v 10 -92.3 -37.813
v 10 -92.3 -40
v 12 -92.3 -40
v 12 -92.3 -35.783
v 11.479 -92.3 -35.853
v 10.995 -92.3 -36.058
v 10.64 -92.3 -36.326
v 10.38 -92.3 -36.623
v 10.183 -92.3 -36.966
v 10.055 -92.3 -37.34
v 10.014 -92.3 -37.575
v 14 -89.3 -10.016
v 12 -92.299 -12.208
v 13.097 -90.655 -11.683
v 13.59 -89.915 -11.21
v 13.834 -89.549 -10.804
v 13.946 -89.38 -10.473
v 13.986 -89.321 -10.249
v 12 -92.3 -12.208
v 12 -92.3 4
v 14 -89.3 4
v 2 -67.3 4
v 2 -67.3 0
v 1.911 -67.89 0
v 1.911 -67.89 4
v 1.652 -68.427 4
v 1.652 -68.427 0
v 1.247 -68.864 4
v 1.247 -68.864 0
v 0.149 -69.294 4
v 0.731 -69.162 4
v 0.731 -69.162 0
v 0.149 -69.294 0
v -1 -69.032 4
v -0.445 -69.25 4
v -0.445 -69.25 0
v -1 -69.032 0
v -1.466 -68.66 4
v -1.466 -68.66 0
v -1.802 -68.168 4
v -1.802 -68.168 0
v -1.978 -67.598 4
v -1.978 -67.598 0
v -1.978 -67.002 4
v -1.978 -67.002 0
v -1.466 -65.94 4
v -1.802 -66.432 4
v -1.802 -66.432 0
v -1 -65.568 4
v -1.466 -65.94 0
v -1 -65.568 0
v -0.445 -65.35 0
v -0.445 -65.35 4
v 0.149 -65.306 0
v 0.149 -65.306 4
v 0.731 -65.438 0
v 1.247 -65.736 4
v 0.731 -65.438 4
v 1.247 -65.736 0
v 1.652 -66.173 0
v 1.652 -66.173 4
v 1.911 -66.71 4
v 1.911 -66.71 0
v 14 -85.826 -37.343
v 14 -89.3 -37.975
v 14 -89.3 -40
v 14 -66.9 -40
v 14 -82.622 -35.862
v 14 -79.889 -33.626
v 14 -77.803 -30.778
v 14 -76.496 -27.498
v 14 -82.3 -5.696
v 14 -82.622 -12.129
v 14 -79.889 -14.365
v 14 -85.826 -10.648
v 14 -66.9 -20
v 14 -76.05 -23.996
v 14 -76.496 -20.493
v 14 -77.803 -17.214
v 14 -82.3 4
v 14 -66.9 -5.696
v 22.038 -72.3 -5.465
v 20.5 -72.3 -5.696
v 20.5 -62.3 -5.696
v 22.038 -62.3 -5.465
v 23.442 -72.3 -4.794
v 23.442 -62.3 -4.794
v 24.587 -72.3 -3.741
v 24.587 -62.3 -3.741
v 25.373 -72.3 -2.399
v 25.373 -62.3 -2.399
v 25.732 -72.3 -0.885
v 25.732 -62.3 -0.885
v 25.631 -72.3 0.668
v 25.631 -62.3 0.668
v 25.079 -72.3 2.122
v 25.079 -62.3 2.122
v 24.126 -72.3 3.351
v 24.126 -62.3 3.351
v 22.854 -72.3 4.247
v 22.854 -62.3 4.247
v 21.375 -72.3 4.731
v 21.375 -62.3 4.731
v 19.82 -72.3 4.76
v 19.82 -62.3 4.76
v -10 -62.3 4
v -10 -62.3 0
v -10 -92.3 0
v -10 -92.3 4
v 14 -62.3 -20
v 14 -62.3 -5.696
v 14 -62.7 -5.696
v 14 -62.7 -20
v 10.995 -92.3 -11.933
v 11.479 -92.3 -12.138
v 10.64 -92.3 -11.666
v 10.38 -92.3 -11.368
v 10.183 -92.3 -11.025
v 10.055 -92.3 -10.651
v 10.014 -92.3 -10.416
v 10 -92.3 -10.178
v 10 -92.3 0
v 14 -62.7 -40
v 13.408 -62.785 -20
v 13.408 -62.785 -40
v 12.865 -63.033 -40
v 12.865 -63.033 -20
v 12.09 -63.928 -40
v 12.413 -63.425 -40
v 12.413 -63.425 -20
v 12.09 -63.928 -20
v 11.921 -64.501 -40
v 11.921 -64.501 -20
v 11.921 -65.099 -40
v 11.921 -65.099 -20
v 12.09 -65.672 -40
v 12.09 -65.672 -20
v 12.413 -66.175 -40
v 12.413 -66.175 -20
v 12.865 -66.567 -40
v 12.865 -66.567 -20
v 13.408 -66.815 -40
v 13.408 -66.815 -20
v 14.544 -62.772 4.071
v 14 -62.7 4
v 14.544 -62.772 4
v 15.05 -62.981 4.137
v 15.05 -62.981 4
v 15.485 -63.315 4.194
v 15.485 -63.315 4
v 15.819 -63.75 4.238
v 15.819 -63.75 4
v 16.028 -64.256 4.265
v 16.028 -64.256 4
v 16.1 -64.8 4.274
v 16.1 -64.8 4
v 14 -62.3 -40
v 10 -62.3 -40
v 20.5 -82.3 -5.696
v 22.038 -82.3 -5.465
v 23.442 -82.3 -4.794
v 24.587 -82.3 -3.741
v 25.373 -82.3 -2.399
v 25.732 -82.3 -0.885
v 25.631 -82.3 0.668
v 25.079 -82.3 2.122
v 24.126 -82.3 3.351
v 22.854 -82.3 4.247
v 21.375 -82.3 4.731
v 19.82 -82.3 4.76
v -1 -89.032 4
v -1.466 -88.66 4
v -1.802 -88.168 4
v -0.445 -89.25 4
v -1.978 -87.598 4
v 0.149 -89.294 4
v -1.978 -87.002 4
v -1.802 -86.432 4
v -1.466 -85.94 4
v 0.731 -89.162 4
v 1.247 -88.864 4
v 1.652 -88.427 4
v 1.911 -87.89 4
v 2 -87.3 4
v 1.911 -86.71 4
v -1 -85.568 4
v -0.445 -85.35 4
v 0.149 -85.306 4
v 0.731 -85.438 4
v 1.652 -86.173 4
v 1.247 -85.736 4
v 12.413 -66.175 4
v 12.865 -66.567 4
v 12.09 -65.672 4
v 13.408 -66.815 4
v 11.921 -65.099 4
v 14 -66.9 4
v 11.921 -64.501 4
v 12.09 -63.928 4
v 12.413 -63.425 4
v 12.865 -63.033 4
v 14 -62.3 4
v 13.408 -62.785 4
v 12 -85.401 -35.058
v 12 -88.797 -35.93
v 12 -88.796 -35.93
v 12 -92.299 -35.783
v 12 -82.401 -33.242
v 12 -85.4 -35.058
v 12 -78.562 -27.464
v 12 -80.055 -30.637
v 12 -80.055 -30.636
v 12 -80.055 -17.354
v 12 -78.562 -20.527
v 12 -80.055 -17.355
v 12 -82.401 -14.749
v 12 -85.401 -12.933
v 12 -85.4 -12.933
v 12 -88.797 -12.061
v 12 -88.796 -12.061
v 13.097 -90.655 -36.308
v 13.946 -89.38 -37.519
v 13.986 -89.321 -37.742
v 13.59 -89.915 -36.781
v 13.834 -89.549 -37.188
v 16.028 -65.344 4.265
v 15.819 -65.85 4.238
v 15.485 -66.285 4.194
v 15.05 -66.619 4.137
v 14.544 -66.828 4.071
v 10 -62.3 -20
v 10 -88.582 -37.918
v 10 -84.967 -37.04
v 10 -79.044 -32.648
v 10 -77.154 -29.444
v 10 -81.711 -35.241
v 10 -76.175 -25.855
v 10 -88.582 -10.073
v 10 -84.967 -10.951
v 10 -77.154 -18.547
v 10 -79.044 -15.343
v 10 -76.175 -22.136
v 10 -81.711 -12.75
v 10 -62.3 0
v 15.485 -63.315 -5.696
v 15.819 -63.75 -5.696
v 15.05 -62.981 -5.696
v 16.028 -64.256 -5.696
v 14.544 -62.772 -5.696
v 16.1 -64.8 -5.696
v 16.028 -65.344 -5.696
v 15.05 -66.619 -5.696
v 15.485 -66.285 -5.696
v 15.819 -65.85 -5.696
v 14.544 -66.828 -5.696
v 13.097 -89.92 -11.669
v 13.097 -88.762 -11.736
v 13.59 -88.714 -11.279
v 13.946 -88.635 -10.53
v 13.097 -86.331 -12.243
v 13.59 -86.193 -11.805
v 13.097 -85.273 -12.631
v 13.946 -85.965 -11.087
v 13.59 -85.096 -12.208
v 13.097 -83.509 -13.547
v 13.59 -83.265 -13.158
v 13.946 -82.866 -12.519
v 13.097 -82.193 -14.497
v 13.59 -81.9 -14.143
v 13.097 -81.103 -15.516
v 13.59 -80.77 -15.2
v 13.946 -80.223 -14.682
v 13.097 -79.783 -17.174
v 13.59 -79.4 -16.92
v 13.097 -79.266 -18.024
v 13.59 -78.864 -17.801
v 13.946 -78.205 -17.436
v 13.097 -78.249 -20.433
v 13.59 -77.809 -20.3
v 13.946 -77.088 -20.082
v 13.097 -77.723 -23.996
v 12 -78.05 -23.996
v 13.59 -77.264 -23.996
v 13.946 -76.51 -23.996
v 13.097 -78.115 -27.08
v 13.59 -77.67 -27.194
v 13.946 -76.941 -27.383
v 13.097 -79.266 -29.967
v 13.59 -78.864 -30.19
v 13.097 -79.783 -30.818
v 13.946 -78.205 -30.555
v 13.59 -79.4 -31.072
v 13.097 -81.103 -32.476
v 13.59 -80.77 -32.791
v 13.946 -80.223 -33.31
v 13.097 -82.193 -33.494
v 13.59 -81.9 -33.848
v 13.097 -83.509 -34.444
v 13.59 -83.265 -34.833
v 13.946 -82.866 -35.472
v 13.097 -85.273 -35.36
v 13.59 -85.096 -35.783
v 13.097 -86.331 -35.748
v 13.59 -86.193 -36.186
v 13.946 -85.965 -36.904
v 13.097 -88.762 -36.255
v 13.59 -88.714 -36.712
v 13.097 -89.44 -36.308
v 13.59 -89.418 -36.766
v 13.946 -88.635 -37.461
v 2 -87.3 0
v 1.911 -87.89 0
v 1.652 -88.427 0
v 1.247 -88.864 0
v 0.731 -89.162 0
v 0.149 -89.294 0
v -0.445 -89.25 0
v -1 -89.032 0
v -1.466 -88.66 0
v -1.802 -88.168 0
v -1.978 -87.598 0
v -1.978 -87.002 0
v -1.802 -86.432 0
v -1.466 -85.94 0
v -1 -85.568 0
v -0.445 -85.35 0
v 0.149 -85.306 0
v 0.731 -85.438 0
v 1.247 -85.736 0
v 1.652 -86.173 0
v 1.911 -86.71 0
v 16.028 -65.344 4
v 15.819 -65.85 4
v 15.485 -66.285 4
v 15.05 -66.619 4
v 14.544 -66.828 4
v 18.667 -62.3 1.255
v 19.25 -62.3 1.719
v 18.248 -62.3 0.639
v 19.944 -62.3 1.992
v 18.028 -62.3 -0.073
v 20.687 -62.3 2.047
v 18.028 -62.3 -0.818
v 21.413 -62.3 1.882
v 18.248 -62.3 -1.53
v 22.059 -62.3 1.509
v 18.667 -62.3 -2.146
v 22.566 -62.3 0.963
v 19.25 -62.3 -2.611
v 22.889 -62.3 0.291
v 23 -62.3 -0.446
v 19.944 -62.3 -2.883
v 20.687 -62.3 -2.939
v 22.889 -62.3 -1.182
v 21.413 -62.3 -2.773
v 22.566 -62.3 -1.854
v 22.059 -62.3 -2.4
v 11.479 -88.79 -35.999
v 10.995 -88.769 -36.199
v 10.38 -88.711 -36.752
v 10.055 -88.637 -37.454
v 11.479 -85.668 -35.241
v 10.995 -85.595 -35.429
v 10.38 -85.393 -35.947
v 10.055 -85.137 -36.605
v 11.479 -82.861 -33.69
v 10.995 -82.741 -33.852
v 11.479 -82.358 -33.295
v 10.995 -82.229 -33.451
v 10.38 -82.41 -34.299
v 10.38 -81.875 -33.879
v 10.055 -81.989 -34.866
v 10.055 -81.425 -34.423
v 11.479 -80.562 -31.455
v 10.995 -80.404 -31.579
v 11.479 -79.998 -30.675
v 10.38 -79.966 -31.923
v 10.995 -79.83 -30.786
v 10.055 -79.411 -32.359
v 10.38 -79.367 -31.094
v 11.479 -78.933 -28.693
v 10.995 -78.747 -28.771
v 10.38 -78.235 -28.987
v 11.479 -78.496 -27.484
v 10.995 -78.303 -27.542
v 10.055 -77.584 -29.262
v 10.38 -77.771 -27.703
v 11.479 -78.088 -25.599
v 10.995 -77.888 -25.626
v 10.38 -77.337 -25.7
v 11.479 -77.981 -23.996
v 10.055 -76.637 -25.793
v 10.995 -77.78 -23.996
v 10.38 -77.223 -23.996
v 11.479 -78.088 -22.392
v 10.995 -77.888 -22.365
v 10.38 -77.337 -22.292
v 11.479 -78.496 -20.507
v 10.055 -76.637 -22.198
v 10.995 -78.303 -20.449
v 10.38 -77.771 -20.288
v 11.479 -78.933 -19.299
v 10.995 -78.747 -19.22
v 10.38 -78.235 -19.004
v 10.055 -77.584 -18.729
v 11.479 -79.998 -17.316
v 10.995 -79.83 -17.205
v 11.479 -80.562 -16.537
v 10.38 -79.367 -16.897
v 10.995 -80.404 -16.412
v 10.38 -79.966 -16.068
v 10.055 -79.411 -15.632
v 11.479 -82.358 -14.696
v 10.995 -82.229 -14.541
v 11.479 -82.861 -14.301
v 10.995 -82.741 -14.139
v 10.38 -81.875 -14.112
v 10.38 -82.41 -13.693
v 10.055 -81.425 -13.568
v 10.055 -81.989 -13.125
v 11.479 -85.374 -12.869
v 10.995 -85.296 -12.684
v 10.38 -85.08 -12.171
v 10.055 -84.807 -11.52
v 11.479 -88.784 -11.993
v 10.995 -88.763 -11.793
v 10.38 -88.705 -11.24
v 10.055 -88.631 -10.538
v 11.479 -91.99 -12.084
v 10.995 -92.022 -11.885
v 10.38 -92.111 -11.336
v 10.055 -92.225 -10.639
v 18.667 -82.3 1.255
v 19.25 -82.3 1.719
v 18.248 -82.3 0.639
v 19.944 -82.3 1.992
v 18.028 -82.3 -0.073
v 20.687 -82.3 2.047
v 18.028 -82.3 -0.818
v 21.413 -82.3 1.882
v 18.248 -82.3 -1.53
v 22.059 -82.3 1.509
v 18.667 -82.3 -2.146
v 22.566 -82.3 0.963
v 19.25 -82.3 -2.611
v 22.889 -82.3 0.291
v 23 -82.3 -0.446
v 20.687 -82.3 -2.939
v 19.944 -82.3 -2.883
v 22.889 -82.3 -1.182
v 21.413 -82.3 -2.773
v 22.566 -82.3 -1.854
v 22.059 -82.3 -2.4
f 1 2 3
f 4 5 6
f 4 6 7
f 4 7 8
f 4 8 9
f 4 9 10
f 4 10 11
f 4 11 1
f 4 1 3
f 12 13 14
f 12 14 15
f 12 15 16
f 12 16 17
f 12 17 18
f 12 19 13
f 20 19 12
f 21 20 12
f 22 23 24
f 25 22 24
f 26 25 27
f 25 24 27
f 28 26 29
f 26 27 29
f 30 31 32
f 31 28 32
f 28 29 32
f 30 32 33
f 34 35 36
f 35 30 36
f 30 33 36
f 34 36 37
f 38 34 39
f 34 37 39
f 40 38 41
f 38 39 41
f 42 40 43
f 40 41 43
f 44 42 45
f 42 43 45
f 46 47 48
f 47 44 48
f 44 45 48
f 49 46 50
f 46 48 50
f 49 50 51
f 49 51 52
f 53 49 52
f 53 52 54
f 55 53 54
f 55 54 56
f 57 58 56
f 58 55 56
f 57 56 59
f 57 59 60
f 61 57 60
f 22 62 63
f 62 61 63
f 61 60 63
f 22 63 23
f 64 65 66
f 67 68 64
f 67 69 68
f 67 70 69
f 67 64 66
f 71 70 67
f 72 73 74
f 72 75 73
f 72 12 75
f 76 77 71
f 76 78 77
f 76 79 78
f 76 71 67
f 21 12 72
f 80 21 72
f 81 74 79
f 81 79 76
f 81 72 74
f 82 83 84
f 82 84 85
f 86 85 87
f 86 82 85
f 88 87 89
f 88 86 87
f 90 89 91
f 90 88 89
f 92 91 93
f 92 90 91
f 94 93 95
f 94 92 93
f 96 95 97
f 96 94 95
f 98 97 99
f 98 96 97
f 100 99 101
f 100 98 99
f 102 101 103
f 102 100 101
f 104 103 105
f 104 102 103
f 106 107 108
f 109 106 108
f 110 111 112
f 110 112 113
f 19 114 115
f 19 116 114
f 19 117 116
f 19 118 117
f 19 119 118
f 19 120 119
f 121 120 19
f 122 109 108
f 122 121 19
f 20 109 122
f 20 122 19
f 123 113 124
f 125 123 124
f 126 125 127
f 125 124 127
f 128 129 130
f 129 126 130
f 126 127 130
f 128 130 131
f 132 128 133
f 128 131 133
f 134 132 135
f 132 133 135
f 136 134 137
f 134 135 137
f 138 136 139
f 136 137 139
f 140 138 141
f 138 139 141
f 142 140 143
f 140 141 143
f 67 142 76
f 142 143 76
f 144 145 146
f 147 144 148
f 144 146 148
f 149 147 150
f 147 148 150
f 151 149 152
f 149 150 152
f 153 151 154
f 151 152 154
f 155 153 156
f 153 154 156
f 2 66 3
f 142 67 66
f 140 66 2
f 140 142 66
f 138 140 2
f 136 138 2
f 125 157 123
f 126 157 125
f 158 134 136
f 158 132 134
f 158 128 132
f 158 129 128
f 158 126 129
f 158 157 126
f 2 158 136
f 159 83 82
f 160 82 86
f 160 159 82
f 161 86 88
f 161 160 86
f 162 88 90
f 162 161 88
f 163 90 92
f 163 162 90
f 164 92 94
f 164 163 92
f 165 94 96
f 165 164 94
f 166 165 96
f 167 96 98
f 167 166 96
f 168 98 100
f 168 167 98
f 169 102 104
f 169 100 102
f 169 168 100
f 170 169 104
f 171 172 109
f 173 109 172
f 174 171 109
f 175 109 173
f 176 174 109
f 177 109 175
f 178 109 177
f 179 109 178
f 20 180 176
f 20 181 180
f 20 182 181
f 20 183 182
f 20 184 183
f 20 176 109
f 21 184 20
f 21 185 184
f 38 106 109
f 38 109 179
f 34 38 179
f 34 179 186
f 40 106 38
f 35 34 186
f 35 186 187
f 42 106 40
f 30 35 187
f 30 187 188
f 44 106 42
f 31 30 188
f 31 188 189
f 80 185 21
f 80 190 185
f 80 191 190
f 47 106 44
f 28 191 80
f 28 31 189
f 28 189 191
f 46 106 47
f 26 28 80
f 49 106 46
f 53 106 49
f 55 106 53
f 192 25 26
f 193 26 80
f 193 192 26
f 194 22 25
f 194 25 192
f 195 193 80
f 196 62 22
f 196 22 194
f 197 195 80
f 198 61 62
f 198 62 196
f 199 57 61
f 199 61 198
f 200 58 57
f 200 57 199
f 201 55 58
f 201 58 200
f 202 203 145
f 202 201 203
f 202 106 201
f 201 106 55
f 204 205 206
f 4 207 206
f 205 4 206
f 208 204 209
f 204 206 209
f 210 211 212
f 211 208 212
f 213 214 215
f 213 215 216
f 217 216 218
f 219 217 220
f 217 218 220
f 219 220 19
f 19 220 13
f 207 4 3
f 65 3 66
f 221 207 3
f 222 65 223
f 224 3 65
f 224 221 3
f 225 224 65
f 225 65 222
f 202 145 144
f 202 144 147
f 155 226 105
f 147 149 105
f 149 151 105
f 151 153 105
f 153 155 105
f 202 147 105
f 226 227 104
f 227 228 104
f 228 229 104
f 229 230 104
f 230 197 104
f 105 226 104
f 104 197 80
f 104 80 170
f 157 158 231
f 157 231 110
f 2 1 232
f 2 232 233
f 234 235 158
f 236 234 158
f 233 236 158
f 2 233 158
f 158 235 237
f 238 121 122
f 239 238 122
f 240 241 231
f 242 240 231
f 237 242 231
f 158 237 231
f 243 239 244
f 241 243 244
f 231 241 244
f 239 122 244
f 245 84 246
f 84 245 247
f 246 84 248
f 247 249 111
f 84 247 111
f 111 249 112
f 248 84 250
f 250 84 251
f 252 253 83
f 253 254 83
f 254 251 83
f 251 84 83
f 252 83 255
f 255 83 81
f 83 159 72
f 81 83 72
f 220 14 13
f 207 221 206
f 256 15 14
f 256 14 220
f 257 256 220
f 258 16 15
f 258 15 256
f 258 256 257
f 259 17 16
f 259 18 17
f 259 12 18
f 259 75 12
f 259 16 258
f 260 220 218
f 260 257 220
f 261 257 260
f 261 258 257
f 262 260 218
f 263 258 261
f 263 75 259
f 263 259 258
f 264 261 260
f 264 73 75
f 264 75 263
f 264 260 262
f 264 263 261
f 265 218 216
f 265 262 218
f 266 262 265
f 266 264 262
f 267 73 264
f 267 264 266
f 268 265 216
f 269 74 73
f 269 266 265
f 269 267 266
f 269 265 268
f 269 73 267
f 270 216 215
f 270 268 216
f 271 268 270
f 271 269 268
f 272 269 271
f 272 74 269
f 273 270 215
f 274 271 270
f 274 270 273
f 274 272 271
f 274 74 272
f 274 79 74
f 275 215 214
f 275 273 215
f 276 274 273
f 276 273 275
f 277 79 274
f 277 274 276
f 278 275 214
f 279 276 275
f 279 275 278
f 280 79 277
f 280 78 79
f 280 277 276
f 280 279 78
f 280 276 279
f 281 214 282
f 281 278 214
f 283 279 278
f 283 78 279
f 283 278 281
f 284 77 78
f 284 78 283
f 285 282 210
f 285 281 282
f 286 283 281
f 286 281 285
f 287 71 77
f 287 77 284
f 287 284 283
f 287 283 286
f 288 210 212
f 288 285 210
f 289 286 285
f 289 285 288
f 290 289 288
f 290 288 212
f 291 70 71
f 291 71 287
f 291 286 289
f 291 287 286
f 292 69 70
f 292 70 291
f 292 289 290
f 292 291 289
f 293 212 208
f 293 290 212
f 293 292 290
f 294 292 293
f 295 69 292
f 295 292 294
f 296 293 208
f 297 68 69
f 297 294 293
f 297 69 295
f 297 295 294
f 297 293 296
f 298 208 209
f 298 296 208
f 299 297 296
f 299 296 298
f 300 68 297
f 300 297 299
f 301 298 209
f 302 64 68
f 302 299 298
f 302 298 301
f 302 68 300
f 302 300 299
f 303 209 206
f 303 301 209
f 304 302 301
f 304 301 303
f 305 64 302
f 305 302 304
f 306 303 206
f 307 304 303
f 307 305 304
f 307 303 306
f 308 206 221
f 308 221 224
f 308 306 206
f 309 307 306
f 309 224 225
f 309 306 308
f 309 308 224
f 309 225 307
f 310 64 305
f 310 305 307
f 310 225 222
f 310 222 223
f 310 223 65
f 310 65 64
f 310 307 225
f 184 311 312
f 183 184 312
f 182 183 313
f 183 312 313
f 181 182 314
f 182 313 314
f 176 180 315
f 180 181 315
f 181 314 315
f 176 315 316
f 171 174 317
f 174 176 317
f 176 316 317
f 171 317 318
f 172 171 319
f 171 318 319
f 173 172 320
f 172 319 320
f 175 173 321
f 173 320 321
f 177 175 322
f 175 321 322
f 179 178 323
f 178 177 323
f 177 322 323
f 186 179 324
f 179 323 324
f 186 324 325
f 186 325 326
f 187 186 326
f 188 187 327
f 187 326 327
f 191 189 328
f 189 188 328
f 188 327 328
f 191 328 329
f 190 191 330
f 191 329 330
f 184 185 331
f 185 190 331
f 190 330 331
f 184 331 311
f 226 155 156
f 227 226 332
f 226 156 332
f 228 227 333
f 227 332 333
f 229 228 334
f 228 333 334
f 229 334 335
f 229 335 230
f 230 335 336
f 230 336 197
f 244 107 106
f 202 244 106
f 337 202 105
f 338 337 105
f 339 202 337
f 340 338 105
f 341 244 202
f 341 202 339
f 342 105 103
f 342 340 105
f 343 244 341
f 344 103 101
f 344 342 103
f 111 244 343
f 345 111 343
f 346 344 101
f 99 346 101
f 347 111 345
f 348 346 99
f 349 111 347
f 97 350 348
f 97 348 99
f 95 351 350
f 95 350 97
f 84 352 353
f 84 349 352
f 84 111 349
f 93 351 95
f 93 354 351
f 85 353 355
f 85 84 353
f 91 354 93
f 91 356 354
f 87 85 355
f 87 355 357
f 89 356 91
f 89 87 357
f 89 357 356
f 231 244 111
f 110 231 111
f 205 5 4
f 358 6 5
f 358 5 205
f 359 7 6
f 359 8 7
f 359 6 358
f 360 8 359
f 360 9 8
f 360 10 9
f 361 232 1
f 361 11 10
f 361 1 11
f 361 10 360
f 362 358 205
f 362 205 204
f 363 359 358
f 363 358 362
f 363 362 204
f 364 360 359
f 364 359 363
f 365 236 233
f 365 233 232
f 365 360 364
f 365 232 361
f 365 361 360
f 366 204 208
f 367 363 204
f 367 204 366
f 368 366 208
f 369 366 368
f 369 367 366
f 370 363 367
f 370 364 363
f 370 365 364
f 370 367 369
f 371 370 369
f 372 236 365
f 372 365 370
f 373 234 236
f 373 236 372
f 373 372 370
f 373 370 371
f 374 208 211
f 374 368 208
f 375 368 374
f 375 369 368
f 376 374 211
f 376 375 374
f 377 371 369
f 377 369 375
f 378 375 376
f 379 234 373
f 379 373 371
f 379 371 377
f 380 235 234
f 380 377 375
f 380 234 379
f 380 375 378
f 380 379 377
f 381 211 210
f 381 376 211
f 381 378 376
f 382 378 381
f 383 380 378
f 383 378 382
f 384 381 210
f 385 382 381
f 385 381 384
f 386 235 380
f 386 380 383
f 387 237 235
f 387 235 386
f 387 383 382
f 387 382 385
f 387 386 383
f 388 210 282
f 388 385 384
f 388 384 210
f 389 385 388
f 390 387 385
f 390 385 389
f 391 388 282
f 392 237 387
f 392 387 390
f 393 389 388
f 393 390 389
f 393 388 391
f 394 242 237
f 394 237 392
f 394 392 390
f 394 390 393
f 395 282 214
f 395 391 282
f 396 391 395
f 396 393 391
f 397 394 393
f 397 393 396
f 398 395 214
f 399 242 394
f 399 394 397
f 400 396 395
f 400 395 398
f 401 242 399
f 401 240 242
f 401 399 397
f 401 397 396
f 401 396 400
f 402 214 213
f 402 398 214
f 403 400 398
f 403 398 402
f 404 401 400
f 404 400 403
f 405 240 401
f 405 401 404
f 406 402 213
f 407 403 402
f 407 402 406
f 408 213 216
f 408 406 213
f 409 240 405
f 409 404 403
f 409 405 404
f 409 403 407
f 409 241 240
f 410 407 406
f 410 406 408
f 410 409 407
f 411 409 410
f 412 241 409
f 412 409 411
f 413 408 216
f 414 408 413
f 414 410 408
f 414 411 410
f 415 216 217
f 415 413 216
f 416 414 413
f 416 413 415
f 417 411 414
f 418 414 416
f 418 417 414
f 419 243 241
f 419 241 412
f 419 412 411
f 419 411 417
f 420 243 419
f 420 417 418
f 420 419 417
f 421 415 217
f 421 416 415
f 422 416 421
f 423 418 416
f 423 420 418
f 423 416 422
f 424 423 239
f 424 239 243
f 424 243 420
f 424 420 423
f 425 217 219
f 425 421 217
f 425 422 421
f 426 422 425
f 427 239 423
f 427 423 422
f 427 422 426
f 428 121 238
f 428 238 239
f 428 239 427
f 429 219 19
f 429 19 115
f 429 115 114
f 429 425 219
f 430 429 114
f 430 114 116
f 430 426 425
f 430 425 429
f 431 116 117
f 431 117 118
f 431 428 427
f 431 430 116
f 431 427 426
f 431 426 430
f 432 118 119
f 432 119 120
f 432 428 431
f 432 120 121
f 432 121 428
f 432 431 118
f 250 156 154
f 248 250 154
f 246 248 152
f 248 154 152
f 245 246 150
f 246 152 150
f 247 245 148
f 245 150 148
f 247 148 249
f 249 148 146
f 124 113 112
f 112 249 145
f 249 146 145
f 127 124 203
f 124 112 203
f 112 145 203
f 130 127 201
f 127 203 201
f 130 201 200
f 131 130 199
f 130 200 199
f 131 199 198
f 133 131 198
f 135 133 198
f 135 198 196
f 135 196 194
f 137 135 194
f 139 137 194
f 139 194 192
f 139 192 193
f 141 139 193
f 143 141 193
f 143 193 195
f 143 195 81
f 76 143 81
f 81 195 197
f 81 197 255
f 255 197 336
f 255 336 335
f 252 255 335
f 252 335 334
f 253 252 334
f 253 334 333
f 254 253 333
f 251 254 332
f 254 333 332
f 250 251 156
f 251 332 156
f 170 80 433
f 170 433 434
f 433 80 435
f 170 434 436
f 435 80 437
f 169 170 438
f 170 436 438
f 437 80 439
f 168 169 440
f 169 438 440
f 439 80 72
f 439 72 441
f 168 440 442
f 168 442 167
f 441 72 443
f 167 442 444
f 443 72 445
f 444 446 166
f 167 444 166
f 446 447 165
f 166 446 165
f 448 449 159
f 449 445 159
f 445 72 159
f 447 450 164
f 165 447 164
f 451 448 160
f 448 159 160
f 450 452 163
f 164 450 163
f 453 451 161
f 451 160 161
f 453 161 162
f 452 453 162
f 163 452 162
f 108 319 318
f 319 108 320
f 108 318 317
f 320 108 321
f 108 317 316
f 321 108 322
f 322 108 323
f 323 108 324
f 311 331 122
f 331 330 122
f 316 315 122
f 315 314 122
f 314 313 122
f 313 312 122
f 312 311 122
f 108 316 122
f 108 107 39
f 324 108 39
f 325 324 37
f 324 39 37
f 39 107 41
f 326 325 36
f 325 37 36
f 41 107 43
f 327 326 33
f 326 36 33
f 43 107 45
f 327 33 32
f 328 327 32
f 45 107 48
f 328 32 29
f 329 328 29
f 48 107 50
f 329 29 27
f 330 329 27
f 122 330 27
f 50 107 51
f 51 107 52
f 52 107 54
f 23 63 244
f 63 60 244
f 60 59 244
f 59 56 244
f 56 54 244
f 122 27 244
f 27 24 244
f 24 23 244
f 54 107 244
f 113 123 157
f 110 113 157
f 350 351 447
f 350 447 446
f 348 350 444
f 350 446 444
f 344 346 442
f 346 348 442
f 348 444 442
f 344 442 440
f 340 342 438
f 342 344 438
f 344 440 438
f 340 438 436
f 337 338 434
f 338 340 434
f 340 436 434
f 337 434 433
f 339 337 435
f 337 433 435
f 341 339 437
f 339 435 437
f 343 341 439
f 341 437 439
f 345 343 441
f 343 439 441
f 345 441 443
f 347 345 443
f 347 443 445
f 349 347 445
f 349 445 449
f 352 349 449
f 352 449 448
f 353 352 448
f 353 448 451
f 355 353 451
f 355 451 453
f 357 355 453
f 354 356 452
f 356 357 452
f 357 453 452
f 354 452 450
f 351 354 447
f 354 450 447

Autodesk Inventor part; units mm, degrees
ref_plane "YZ Plane" through (0, 0, 0) normal (1, 0, 0) x (0, 1, 0)
ref_plane "XZ Plane" through (0, 0, 0) normal (0, 1, 0) x (-1, 0, 0)
sketch "Sketch1" plane through (0, 0, 0) normal (0, 0, 1) x (1, 0, 0)
  line L0 (10, 0) -> (10, -500) projected
  line L1 (-10, 0) -> (-10, -500) projected
  line L2 (13.8571, -62.3) -> (-6.0929, -62.3) projected
  line L3 (10, -62.3) -> (-10, -62.3)
  line L4 (-10, -62.3) -> (-10, -92.3)
  line L5 (-10, -92.3) -> (10, -92.3)
  line L6 (10, -92.3) -> (10, -62.3)
  circle A0 centre (0, -87.3) radius 2
  circle A1 centre (0, -67.3) radius 2
  point P0 (0, 0)
  dimension "d0" = 30
  dimension "d1" = 4
  dimension "d2" = 4
  dimension "d3" = 5
  dimension "d4" = 5
extrude "Extrusion1" add sketch "Sketch1" along normal blind 4
ref_plane "Work Plane1" through (-10, -77.3, 0) normal (0, 1, 0) x (1, 0, 0)
sketch "Sketch3" plane through (10, -92.3, 0) normal (1, 0, 0) x (0, 0, -1)
  line L0 (0, 0) -> (0, 30) projected
  line L1 (0, 30) -> (-4, 30) projected
  line L2 (-4, 0) -> (-4, 30) projected
  line L3 (0, 0) -> (-4, 0) projected
  line L4 (0, 0) -> (0, 30) projected
  line L5 (0, 0) -> (20, 0)
  line L6 (20, 0) -> (20, 30)
  line L7 (20, 30) -> (0, 30)
  line L8 (0, 30) -> (0, 0)
  circle A0 centre (10, 25) radius 2
  circle A1 centre (10, 5) radius 2
  point P0 (0, 92.3)
  dimension "d12" = 20
  dimension "d13" = 4
  dimension "d14" = 4
  dimension "d15" = 5
  dimension "d16" = 5
extrude "Extrusion3" add sketch "Sketch3" along normal blind 4 contours L3 L2 L1 L0 | L0 L7 L6 L5 | A0 | A1
sketch "Sketch2" plane through (-10, -77.3, 0) normal (0, 1, 0) x (1, 0, 0)
  line L0 (20, -4) -> (0, -4) projected
  line L1 (20, 0) -> (0, 0) projected
  line L2 (0, 0) -> (0, -4) projected
  line L3 (0, -4) -> (24, -4) projected
  line L4 (24, 20) -> (24, -4) projected
  line L5 (20, 20) -> (24, 20) projected
  line L6 (20, 20) -> (20, 0) projected
  line L7 (24, -4) -> (24, 20) projected
  circle A0 centre (30.5, 0.4456) radius 2.5
  circle A1 centre (30.5, 0.4456) radius 5.25
  line L8 (24, 20) -> (34.8957, 3.3163)
  line L9 (24, -4) -> (29.82, -4.7602)
  line L10 (30.5, 5.6956) -> (24, 5.6956)
  point P0 (10, 0)
  point P1 (24, 0.4456)
  dimension "d26" = 5
  dimension "d27" = 2.75
  dimension "d29" = 4.4456
  dimension "d30" = 6.5
  dimension "d50" = 10.5
extrude "Extrusion2" add sketch "Sketch2" along normal mid plane 10 contours L4 L10 A1 L9 | A1
sketch "Sketch4" plane through (-10, -72.3, 0) normal (0, 1, 0) x (1, 0, 0)
  line L0 (23.958, -4) -> (24, -4) projected
  line L1 (24, -4) -> (24, -8.9113)
  arc A0 (29.82, -4.7602) -> (30.5, 5.6956) centre (30.5, 0.4456) ccw projected
  circle A1 centre (30.5, 0.4456) radius 2.5 projected
  line L2 (30.5, 5.6956) -> (24, 5.6956) projected
  line L3 (24, -4) -> (24, 5.6956) projected
  line L4 (24, -4) -> (29.82, -4.7602) projected
  point P0 (10, 0)
  point P1 (0, -4)
  point P2 (24, -4.0444)
extrude "Extrusion4" add sketch "Sketch4" along normal blind 10
fillet "Fillet1" [suppressed]
sketch "Sketch5" plane through (-10, -62.3, 4) normal (0, 1, 0) x (1, 0, 0)
  circle A0 centre (30.5, 4.4456) radius 2.5 projected
  line L0 (20, 24) -> (22, 44)
  line L1 (22, 44) -> (24, 44)
  line L2 (24, 44) -> (21.9516, 23.5162)
  line L3 (20, 24) -> (24, 24) projected
  point P0 (10, 4)
  point P1 (22, 24)
  dimension "d38" = 2
  dimension "d39" = 6.5
  dimension "d40" = 20
extrude "Extrusion5" [suppressed]
fillet "Fillet2" [suppressed]
sketch "Sketch6" plane through (0, 0, 4) normal (0, 0, 1) x (1, 0, 0)
  circle A0 centre (14, -64.8) radius 2.1
  line L0 (25.7065, -62.3) -> (14, -62.3) projected
  line L1 (10, -92.3) -> (10, -62.3) projected
  line L2 (18, -62.3) -> (18, -82.3) projected
  line L3 (23, -62.3) -> (23, -96.3)
  line L4 (19.3, -67.6) -> (49.3, -67.6) projected
  line L5 (19.45, -67.3) -> (49.45, -67.3) projected
  point P0 (0, 0)
  dimension "d42" = 4.2
  dimension "d43" = 2.5
  dimension "d44" = 4
extrude "Extrusion6" cut sketch "Sketch6" along normal mid plane 100
chamfer "Chamfer1" distance 3 distance2 2 1 edges at (14, -92.3, -8) measured on face at (14, -80.5, -15.2319)
sketch "Sketch7" plane through (10, -92.3, -20) normal (0, 0, -1) x (-1, 0, 0)
  line L0 (-2, 0) -> (-4, 3) projected
  line L1 (0, 0) -> (-2, 0) projected
  line L2 (0, 0) -> (0, 30) projected
  line L3 (0, 30) -> (-4, 30) projected
  line L4 (-4, 29.6) -> (-4, 30) projected
  arc A0 (-4, 25.4) -> (-4, 29.6) centre (-4, 27.5) ccw projected
  line L5 (-4, 3) -> (-4, 25.4) projected
  point P0 (10, 92.3)
extrude "Extrusion7" add sketch "Sketch7" along normal blind 20
sketch "Sketch8" plane through (14, -92.3, 0) normal (1, 0, 0) x (0, 0, -1)
  line L0 (2.9456, 30) -> (2.9456, 10) projected
  line L1 (-2.0544, 30) -> (-2.0544, 10) projected
  circle A0 centre (23.9956, 2.25) radius 12
  line L2 (5.6956, 10) -> (-4, 10) projected
  point P0 (0, 92.3)
  point P1 (0.4456, 12.1254)
  dimension "d53" = 5
  dimension "d54" = 2.5
  dimension "d55" = 24
  dimension "d56" = 7.75
  dimension "d57" = 23.55
extrude "Extrusion8" cut sketch "Sketch8" against normal blind 10
fillet "Fillet3" radius 2 2 edges at (10, -78.05, -23.9956) (14, -78.05, -23.9956)
equation "\"d16\" = d15"
equation "\"d54\" = 0.5 * d53"
equation "\"d7\" = -0.5 * d0"
properties part number "tool dock" material "Polycarbonate, Clear"
